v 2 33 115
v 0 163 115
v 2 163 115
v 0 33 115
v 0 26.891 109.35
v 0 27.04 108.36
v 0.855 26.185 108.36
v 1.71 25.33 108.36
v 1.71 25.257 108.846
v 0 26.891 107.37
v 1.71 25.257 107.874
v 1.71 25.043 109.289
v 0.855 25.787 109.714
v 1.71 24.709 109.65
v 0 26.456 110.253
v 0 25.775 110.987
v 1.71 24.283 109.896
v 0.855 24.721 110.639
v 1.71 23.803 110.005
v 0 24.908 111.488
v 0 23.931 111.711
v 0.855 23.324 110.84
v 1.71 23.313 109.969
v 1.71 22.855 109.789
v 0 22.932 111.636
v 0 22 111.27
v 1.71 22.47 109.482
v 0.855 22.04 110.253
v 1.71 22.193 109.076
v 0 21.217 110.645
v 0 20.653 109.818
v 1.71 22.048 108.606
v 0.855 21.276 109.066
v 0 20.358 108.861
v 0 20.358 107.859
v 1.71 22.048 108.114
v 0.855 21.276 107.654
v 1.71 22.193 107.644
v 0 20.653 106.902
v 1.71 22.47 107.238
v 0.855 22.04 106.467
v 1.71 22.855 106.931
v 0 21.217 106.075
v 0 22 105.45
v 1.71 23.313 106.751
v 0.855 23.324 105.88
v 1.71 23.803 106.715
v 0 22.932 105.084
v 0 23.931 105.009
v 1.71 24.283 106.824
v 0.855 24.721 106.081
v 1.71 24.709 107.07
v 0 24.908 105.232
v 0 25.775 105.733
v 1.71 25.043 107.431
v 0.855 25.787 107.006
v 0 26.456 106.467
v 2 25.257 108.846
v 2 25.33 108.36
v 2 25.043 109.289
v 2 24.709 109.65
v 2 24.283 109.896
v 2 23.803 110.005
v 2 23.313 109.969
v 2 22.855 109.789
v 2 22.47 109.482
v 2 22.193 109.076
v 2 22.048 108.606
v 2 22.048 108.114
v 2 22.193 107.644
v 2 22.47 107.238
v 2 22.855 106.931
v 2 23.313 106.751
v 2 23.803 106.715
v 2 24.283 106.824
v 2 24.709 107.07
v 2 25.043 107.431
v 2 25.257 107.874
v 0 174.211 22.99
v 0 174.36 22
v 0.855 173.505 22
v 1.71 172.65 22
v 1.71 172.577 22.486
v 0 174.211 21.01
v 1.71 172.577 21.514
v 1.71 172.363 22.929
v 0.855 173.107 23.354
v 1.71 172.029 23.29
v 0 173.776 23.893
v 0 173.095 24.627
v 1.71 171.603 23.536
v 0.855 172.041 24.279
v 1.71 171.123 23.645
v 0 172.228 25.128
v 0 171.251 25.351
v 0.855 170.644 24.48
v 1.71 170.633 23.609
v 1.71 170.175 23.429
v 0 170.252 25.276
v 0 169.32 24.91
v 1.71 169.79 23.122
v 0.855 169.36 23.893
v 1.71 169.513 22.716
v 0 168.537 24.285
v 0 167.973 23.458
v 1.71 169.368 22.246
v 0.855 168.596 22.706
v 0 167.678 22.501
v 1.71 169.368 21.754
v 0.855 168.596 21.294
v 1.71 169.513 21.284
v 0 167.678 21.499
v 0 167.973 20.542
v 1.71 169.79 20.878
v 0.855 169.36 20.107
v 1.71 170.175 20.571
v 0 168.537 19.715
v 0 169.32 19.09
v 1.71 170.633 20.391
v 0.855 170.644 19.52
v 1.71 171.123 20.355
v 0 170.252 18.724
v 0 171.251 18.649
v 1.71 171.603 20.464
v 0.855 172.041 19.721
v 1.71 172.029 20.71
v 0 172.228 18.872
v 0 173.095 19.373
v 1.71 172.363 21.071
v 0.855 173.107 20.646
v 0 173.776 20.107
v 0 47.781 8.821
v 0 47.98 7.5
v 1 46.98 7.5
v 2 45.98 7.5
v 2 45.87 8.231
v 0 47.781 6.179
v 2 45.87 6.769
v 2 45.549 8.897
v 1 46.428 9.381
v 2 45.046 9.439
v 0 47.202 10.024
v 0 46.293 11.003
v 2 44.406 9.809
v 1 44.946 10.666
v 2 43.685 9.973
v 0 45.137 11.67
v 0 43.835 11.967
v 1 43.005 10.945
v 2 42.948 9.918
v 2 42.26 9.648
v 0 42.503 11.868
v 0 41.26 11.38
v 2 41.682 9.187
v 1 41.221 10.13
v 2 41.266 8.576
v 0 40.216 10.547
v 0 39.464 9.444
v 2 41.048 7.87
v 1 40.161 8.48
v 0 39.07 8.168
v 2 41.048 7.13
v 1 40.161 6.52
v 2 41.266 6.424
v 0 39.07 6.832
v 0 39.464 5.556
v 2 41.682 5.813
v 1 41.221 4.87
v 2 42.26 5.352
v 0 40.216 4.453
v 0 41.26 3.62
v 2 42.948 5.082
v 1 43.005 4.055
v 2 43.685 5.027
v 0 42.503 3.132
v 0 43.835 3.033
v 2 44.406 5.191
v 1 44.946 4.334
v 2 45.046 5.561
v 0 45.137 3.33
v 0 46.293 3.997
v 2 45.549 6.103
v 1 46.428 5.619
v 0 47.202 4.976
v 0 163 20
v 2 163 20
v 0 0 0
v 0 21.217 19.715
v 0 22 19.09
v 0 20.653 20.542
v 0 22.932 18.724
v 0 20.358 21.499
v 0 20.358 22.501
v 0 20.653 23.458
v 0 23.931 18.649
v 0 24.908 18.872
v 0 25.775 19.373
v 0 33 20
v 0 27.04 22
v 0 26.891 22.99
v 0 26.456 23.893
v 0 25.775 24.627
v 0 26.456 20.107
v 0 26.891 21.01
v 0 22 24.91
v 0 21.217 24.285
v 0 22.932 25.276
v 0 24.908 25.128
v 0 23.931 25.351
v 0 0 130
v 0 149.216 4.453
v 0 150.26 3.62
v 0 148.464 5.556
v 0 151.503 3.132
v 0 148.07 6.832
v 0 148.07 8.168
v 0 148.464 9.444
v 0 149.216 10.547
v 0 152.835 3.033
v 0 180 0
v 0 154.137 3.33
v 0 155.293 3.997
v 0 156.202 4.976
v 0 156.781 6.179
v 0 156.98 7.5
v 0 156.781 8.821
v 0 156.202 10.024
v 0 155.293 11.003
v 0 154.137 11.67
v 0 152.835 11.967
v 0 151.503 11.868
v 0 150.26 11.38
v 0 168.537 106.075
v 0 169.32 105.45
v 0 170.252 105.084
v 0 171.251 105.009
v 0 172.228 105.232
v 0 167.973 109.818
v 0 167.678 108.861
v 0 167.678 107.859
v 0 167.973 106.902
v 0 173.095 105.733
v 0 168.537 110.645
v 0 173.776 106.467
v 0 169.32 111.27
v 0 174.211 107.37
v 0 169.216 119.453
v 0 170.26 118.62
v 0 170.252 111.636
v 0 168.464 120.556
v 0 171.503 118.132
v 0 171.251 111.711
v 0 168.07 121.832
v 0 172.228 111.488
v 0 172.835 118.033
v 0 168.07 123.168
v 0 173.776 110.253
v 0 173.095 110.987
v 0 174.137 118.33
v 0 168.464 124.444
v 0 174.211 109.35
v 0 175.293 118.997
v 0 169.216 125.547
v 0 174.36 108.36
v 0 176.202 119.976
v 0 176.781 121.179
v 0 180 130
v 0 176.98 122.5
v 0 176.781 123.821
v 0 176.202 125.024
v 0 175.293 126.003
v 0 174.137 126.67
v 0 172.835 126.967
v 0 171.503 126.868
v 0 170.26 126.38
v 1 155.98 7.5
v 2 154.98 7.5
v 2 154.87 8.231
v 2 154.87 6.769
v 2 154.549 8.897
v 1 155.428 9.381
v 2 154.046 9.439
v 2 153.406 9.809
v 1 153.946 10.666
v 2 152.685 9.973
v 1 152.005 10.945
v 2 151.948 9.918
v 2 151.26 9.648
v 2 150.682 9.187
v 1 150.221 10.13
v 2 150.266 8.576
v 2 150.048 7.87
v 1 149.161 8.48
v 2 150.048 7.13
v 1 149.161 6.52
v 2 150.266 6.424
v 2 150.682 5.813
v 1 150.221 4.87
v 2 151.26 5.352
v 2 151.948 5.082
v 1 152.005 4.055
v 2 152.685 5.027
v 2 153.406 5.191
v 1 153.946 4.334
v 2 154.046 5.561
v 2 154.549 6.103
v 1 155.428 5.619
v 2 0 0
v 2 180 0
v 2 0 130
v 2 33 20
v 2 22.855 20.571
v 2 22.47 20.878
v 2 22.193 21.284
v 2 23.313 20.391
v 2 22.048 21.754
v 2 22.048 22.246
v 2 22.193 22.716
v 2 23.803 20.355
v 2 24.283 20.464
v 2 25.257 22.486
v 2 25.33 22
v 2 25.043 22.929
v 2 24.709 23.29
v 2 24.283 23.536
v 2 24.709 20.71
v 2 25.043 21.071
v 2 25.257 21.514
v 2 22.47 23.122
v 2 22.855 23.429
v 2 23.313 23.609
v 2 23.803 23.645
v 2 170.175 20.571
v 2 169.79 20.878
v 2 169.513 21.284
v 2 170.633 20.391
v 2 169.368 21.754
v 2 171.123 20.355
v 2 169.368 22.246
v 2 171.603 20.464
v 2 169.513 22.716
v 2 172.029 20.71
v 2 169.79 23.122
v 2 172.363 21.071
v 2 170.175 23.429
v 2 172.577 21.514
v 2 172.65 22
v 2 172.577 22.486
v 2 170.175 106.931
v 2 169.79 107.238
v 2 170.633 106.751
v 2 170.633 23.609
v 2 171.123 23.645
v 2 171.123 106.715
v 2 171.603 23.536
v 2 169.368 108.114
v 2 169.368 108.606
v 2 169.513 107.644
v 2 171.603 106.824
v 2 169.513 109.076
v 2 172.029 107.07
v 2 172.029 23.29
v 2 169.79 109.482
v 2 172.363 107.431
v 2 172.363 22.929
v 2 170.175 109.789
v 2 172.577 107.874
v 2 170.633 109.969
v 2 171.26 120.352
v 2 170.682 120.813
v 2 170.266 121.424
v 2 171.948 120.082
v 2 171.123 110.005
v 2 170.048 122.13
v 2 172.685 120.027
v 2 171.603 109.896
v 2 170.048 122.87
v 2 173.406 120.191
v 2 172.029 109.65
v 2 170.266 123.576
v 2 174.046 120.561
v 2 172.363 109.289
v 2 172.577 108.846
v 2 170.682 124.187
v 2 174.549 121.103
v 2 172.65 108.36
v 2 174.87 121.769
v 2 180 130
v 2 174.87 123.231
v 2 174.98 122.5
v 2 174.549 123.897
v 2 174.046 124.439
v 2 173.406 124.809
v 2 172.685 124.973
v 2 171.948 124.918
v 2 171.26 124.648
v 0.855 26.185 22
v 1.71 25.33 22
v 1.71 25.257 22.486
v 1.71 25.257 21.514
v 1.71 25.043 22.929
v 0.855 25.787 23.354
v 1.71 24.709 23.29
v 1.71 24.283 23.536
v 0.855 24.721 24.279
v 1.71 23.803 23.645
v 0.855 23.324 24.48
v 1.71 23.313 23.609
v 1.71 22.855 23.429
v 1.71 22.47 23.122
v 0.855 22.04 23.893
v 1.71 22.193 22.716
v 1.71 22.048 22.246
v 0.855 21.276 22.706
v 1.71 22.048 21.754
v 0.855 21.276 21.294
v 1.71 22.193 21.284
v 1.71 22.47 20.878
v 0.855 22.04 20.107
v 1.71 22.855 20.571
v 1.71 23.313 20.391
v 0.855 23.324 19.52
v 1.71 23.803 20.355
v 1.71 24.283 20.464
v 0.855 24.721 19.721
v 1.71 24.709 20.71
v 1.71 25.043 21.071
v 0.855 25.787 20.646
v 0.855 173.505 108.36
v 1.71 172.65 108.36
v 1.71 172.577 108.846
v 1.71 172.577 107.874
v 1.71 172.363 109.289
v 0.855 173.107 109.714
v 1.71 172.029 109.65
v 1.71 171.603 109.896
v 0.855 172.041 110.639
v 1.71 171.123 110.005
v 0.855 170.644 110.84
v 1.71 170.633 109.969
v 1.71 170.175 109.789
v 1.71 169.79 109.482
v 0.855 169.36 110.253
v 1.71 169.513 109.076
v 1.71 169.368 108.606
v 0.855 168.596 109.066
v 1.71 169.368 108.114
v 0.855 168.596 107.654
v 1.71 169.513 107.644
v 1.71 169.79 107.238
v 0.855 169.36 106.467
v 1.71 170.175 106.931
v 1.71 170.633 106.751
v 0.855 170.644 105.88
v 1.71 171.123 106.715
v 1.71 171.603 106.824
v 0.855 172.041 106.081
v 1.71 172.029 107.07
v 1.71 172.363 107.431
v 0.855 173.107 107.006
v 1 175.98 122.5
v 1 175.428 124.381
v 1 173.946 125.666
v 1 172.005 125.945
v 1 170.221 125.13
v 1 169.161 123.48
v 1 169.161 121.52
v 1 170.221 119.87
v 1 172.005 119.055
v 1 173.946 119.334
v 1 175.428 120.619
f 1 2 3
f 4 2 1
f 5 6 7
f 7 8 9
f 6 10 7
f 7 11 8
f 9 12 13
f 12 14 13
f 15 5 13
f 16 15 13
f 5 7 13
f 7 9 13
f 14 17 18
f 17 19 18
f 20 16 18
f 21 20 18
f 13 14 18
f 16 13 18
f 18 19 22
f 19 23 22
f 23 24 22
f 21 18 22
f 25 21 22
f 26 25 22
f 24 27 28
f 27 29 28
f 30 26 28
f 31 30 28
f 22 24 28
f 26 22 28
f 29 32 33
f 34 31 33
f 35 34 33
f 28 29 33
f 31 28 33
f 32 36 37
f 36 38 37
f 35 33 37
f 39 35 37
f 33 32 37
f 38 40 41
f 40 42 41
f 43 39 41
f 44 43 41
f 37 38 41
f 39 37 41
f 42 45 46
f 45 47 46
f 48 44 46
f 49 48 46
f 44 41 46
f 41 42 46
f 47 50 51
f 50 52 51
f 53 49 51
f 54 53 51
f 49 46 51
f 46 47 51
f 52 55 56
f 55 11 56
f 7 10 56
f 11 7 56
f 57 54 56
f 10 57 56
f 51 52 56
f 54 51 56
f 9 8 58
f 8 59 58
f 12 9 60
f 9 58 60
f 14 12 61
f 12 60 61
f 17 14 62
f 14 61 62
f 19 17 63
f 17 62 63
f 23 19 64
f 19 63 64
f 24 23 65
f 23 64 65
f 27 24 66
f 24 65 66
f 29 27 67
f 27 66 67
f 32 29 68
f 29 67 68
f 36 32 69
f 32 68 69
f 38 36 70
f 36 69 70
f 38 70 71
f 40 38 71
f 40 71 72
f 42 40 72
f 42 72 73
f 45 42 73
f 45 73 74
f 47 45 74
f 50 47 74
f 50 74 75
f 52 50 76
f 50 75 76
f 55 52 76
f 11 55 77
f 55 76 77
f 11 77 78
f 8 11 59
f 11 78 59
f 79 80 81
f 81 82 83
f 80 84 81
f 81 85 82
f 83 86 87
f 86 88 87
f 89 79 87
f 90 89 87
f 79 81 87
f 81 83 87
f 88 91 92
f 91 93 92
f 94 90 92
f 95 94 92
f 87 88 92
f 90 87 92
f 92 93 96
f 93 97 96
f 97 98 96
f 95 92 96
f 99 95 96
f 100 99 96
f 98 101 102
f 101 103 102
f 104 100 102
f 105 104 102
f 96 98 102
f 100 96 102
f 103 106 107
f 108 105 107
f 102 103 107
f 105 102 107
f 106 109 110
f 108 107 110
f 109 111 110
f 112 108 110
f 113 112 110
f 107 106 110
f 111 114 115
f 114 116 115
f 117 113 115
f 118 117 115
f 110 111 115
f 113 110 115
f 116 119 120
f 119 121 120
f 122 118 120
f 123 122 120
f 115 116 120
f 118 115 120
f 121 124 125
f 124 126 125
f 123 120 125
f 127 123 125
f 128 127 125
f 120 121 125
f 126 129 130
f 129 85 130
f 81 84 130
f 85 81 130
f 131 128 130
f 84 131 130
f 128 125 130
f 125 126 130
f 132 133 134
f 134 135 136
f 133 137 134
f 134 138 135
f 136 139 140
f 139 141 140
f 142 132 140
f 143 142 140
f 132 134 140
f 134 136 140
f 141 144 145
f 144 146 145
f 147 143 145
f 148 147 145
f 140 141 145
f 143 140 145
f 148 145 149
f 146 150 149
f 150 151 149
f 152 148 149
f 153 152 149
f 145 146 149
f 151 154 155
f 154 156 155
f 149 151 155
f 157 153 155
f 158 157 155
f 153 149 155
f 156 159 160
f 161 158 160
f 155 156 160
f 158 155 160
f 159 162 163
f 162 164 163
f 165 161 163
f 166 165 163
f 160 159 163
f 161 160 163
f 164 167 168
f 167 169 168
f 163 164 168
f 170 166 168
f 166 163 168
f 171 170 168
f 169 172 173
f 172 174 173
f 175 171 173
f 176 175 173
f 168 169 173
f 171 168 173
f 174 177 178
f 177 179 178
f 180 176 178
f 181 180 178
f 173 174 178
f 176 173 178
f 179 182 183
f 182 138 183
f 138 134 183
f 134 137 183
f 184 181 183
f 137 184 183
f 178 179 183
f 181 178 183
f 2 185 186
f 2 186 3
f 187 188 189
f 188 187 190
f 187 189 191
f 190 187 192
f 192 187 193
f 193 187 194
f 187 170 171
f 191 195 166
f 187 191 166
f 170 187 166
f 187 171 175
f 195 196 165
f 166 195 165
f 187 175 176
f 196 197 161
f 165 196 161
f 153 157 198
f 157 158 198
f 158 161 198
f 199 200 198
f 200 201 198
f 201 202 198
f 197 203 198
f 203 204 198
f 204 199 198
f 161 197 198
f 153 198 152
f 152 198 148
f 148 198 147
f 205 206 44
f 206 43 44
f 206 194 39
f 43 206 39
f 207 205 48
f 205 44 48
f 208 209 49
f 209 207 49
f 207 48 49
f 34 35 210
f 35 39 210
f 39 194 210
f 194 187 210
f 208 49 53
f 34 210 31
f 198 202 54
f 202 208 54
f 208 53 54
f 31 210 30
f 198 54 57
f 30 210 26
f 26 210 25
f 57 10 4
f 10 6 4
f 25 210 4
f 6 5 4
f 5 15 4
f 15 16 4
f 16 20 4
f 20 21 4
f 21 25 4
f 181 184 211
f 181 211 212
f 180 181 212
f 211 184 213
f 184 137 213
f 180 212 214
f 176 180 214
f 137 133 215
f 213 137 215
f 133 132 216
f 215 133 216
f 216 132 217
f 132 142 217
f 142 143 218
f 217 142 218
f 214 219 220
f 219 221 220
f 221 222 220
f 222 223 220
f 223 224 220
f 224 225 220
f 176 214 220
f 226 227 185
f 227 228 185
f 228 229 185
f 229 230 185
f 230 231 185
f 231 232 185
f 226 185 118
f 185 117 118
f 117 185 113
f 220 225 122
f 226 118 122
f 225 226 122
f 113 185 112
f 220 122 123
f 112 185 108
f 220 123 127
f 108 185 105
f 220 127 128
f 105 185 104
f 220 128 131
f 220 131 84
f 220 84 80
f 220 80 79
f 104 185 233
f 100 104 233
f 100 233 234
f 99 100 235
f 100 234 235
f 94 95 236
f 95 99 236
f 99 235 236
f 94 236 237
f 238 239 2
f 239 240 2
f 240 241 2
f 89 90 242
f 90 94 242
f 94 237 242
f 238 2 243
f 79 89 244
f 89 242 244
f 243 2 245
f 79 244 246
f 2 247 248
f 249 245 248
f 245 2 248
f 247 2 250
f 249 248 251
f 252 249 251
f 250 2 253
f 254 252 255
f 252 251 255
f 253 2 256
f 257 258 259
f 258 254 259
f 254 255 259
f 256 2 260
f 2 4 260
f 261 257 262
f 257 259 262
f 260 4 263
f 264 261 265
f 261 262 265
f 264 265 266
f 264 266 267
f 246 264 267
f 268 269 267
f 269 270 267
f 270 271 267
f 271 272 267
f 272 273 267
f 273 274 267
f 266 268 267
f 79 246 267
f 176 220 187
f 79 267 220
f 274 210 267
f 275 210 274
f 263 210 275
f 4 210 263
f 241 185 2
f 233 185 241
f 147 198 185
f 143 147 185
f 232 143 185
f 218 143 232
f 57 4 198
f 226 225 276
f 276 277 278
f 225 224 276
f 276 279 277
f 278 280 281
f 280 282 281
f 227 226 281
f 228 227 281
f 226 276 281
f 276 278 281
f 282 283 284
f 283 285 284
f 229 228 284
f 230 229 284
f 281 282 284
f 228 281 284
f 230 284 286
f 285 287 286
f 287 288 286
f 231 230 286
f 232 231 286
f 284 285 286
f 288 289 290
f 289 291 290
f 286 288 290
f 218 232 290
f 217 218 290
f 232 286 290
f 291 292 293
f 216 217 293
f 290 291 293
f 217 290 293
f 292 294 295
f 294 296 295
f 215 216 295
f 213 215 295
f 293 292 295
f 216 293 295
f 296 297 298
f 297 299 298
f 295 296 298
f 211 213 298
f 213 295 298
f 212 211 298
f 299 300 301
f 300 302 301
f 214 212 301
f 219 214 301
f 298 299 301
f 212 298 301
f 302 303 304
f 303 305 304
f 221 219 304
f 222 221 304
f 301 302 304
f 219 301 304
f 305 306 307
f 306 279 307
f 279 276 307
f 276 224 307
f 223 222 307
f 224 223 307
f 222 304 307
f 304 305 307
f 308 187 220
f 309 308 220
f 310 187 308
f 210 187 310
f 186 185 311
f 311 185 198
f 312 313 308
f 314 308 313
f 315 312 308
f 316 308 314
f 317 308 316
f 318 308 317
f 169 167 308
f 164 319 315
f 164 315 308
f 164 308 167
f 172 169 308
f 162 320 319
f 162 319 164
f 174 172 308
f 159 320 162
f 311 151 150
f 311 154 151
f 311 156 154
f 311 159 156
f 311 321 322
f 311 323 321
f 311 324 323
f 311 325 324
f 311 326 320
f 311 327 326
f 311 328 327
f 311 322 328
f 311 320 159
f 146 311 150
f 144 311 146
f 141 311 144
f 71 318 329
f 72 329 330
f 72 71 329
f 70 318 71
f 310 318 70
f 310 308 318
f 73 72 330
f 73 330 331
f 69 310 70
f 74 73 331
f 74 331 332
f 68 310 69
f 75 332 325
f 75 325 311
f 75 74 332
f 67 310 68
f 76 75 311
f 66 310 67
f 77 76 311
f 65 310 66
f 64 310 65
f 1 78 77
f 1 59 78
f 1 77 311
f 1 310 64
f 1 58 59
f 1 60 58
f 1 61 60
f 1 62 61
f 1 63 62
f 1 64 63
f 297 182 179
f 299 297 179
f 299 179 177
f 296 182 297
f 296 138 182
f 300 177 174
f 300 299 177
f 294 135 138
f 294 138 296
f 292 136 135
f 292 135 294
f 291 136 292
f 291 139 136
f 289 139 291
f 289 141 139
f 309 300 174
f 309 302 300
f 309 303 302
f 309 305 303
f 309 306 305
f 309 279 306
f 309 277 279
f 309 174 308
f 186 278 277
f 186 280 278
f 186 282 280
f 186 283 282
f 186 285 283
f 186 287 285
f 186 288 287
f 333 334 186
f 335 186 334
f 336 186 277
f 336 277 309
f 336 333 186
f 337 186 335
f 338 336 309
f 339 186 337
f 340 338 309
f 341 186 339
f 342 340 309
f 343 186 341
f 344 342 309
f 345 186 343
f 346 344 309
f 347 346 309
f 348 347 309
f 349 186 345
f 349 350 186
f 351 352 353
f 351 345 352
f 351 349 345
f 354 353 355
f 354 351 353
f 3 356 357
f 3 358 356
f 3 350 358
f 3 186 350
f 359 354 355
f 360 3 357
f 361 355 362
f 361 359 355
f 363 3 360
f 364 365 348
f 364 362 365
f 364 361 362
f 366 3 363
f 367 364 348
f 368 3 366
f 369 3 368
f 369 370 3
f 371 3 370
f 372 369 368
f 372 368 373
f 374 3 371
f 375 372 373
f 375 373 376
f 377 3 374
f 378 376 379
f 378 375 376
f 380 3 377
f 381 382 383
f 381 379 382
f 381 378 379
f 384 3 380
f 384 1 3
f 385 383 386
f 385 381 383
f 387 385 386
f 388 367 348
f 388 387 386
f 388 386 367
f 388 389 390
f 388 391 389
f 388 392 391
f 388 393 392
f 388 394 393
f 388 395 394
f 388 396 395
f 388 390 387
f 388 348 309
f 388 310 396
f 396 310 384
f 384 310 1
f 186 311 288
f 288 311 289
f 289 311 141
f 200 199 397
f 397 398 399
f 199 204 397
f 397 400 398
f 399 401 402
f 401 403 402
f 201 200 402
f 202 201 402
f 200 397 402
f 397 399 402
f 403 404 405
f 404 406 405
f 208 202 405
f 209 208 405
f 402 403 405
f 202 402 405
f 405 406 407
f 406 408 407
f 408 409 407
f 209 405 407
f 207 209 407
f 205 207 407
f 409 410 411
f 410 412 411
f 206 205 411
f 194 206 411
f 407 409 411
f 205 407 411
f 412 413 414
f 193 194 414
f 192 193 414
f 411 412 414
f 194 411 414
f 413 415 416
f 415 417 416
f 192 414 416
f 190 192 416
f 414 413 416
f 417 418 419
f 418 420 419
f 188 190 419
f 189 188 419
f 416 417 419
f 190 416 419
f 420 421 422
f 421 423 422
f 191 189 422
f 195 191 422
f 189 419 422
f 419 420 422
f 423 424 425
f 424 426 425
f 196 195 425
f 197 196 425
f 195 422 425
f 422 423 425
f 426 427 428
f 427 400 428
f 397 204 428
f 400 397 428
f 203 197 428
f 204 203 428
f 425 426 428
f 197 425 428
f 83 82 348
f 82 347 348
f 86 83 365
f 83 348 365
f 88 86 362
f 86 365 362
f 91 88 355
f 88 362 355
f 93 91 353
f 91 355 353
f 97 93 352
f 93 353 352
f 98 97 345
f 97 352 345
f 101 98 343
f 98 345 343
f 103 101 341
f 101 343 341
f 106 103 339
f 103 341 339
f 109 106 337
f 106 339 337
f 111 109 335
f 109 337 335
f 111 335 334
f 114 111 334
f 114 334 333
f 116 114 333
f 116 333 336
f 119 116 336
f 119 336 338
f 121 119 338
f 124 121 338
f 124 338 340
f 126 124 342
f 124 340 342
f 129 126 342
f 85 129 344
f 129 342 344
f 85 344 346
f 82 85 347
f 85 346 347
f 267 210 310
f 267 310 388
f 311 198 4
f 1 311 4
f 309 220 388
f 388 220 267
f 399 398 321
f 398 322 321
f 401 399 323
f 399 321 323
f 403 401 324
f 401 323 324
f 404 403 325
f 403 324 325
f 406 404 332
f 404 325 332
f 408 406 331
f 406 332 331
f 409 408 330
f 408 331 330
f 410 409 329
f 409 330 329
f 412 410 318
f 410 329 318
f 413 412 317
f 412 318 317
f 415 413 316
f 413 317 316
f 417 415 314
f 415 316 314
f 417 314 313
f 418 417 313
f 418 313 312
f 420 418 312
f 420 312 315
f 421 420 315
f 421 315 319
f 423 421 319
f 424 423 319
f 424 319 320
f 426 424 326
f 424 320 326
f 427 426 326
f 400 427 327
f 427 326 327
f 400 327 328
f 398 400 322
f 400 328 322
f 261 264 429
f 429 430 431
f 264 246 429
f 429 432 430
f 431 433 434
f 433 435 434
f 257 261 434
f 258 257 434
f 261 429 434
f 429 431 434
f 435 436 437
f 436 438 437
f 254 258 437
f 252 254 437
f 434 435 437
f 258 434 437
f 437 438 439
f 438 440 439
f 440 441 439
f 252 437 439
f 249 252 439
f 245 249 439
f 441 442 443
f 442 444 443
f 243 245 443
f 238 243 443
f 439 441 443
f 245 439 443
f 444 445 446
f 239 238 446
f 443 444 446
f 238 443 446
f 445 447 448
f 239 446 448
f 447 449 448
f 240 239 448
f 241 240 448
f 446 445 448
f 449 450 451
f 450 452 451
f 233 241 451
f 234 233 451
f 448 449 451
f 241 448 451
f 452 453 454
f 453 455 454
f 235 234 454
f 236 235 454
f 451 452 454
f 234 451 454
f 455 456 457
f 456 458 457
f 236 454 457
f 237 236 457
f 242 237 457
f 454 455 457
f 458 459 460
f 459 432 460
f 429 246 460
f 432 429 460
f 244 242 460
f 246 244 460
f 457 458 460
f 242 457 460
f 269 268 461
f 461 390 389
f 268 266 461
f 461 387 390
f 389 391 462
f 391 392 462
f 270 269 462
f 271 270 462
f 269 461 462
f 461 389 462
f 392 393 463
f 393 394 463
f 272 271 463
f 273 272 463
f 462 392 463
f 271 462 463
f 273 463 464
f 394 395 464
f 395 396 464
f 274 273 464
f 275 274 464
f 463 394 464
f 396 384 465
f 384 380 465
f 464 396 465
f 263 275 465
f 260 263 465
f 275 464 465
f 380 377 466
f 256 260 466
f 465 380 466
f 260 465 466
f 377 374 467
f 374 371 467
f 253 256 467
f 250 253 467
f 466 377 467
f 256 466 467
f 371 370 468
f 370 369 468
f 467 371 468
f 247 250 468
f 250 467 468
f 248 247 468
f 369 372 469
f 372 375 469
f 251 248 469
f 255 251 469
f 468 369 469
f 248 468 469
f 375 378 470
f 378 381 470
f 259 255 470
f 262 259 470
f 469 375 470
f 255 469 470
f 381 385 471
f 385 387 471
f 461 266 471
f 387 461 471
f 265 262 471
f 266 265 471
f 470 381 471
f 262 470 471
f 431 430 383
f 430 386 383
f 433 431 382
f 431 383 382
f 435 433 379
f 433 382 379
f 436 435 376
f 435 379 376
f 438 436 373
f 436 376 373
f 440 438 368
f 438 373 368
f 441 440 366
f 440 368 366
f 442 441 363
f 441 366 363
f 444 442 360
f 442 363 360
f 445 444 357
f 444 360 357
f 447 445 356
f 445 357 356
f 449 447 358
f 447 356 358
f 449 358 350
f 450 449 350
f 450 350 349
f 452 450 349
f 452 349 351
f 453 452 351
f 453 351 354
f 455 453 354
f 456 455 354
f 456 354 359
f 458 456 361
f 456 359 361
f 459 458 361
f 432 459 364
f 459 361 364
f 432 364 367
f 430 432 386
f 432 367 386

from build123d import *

# Parameters (mm, degrees)
F0_W           = 180
F0_H           = 130
F1_DEPTH       = 2
F3_D           = 3.3
F3_CSINK_D     = 6.72
F3_CSINK_ANGLE = 90
F4_W           = 130
F4_H           = 95
F5_DEPTH       = 2.001
F7_D           = 4.4
F7_CSINK_D     = 8.96
F7_CSINK_ANGLE = 90


with BuildPart() as f1:
    # F0 (on Right) → F1 (new body)
    with BuildSketch(Plane.YZ):
        with Locations((90, 65)):
            Rectangle(F0_W, F0_H)
    extrude(amount=F1_DEPTH)

    # F3 (through all)
    with Locations(Plane(origin=(0, 0, 0), x_dir=(0, -1, 0), z_dir=(-1, 0, 0))):
        with Locations((-171, 108.36), (-171, 22), (-23.68, 22), (-23.68, 108.36)):
            CounterSinkHole(F3_D / 2, F3_CSINK_D / 2, counter_sink_angle=F3_CSINK_ANGLE)

    # F4 (on face) → F5 (cut, through all)
    with BuildSketch(Plane(origin=(0, 0, 0), x_dir=(0, -1, 0), z_dir=(-1, 0, 0))):
        with Locations((-98, 67.5)):
            Rectangle(F4_W, F4_H)
    extrude(amount=-F5_DEPTH, mode=Mode.SUBTRACT)

    # F7 (through all)
    with Locations(Plane(origin=(0, 0, 0), x_dir=(0, -1, 0), z_dir=(-1, 0, 0))):
        with Locations((-152.5, 7.5), (-43.5, 7.5), (-172.5, 122.5)):
            CounterSinkHole(F7_D / 2, F7_CSINK_D / 2, counter_sink_angle=F7_CSINK_ANGLE)


solid = f1.part
